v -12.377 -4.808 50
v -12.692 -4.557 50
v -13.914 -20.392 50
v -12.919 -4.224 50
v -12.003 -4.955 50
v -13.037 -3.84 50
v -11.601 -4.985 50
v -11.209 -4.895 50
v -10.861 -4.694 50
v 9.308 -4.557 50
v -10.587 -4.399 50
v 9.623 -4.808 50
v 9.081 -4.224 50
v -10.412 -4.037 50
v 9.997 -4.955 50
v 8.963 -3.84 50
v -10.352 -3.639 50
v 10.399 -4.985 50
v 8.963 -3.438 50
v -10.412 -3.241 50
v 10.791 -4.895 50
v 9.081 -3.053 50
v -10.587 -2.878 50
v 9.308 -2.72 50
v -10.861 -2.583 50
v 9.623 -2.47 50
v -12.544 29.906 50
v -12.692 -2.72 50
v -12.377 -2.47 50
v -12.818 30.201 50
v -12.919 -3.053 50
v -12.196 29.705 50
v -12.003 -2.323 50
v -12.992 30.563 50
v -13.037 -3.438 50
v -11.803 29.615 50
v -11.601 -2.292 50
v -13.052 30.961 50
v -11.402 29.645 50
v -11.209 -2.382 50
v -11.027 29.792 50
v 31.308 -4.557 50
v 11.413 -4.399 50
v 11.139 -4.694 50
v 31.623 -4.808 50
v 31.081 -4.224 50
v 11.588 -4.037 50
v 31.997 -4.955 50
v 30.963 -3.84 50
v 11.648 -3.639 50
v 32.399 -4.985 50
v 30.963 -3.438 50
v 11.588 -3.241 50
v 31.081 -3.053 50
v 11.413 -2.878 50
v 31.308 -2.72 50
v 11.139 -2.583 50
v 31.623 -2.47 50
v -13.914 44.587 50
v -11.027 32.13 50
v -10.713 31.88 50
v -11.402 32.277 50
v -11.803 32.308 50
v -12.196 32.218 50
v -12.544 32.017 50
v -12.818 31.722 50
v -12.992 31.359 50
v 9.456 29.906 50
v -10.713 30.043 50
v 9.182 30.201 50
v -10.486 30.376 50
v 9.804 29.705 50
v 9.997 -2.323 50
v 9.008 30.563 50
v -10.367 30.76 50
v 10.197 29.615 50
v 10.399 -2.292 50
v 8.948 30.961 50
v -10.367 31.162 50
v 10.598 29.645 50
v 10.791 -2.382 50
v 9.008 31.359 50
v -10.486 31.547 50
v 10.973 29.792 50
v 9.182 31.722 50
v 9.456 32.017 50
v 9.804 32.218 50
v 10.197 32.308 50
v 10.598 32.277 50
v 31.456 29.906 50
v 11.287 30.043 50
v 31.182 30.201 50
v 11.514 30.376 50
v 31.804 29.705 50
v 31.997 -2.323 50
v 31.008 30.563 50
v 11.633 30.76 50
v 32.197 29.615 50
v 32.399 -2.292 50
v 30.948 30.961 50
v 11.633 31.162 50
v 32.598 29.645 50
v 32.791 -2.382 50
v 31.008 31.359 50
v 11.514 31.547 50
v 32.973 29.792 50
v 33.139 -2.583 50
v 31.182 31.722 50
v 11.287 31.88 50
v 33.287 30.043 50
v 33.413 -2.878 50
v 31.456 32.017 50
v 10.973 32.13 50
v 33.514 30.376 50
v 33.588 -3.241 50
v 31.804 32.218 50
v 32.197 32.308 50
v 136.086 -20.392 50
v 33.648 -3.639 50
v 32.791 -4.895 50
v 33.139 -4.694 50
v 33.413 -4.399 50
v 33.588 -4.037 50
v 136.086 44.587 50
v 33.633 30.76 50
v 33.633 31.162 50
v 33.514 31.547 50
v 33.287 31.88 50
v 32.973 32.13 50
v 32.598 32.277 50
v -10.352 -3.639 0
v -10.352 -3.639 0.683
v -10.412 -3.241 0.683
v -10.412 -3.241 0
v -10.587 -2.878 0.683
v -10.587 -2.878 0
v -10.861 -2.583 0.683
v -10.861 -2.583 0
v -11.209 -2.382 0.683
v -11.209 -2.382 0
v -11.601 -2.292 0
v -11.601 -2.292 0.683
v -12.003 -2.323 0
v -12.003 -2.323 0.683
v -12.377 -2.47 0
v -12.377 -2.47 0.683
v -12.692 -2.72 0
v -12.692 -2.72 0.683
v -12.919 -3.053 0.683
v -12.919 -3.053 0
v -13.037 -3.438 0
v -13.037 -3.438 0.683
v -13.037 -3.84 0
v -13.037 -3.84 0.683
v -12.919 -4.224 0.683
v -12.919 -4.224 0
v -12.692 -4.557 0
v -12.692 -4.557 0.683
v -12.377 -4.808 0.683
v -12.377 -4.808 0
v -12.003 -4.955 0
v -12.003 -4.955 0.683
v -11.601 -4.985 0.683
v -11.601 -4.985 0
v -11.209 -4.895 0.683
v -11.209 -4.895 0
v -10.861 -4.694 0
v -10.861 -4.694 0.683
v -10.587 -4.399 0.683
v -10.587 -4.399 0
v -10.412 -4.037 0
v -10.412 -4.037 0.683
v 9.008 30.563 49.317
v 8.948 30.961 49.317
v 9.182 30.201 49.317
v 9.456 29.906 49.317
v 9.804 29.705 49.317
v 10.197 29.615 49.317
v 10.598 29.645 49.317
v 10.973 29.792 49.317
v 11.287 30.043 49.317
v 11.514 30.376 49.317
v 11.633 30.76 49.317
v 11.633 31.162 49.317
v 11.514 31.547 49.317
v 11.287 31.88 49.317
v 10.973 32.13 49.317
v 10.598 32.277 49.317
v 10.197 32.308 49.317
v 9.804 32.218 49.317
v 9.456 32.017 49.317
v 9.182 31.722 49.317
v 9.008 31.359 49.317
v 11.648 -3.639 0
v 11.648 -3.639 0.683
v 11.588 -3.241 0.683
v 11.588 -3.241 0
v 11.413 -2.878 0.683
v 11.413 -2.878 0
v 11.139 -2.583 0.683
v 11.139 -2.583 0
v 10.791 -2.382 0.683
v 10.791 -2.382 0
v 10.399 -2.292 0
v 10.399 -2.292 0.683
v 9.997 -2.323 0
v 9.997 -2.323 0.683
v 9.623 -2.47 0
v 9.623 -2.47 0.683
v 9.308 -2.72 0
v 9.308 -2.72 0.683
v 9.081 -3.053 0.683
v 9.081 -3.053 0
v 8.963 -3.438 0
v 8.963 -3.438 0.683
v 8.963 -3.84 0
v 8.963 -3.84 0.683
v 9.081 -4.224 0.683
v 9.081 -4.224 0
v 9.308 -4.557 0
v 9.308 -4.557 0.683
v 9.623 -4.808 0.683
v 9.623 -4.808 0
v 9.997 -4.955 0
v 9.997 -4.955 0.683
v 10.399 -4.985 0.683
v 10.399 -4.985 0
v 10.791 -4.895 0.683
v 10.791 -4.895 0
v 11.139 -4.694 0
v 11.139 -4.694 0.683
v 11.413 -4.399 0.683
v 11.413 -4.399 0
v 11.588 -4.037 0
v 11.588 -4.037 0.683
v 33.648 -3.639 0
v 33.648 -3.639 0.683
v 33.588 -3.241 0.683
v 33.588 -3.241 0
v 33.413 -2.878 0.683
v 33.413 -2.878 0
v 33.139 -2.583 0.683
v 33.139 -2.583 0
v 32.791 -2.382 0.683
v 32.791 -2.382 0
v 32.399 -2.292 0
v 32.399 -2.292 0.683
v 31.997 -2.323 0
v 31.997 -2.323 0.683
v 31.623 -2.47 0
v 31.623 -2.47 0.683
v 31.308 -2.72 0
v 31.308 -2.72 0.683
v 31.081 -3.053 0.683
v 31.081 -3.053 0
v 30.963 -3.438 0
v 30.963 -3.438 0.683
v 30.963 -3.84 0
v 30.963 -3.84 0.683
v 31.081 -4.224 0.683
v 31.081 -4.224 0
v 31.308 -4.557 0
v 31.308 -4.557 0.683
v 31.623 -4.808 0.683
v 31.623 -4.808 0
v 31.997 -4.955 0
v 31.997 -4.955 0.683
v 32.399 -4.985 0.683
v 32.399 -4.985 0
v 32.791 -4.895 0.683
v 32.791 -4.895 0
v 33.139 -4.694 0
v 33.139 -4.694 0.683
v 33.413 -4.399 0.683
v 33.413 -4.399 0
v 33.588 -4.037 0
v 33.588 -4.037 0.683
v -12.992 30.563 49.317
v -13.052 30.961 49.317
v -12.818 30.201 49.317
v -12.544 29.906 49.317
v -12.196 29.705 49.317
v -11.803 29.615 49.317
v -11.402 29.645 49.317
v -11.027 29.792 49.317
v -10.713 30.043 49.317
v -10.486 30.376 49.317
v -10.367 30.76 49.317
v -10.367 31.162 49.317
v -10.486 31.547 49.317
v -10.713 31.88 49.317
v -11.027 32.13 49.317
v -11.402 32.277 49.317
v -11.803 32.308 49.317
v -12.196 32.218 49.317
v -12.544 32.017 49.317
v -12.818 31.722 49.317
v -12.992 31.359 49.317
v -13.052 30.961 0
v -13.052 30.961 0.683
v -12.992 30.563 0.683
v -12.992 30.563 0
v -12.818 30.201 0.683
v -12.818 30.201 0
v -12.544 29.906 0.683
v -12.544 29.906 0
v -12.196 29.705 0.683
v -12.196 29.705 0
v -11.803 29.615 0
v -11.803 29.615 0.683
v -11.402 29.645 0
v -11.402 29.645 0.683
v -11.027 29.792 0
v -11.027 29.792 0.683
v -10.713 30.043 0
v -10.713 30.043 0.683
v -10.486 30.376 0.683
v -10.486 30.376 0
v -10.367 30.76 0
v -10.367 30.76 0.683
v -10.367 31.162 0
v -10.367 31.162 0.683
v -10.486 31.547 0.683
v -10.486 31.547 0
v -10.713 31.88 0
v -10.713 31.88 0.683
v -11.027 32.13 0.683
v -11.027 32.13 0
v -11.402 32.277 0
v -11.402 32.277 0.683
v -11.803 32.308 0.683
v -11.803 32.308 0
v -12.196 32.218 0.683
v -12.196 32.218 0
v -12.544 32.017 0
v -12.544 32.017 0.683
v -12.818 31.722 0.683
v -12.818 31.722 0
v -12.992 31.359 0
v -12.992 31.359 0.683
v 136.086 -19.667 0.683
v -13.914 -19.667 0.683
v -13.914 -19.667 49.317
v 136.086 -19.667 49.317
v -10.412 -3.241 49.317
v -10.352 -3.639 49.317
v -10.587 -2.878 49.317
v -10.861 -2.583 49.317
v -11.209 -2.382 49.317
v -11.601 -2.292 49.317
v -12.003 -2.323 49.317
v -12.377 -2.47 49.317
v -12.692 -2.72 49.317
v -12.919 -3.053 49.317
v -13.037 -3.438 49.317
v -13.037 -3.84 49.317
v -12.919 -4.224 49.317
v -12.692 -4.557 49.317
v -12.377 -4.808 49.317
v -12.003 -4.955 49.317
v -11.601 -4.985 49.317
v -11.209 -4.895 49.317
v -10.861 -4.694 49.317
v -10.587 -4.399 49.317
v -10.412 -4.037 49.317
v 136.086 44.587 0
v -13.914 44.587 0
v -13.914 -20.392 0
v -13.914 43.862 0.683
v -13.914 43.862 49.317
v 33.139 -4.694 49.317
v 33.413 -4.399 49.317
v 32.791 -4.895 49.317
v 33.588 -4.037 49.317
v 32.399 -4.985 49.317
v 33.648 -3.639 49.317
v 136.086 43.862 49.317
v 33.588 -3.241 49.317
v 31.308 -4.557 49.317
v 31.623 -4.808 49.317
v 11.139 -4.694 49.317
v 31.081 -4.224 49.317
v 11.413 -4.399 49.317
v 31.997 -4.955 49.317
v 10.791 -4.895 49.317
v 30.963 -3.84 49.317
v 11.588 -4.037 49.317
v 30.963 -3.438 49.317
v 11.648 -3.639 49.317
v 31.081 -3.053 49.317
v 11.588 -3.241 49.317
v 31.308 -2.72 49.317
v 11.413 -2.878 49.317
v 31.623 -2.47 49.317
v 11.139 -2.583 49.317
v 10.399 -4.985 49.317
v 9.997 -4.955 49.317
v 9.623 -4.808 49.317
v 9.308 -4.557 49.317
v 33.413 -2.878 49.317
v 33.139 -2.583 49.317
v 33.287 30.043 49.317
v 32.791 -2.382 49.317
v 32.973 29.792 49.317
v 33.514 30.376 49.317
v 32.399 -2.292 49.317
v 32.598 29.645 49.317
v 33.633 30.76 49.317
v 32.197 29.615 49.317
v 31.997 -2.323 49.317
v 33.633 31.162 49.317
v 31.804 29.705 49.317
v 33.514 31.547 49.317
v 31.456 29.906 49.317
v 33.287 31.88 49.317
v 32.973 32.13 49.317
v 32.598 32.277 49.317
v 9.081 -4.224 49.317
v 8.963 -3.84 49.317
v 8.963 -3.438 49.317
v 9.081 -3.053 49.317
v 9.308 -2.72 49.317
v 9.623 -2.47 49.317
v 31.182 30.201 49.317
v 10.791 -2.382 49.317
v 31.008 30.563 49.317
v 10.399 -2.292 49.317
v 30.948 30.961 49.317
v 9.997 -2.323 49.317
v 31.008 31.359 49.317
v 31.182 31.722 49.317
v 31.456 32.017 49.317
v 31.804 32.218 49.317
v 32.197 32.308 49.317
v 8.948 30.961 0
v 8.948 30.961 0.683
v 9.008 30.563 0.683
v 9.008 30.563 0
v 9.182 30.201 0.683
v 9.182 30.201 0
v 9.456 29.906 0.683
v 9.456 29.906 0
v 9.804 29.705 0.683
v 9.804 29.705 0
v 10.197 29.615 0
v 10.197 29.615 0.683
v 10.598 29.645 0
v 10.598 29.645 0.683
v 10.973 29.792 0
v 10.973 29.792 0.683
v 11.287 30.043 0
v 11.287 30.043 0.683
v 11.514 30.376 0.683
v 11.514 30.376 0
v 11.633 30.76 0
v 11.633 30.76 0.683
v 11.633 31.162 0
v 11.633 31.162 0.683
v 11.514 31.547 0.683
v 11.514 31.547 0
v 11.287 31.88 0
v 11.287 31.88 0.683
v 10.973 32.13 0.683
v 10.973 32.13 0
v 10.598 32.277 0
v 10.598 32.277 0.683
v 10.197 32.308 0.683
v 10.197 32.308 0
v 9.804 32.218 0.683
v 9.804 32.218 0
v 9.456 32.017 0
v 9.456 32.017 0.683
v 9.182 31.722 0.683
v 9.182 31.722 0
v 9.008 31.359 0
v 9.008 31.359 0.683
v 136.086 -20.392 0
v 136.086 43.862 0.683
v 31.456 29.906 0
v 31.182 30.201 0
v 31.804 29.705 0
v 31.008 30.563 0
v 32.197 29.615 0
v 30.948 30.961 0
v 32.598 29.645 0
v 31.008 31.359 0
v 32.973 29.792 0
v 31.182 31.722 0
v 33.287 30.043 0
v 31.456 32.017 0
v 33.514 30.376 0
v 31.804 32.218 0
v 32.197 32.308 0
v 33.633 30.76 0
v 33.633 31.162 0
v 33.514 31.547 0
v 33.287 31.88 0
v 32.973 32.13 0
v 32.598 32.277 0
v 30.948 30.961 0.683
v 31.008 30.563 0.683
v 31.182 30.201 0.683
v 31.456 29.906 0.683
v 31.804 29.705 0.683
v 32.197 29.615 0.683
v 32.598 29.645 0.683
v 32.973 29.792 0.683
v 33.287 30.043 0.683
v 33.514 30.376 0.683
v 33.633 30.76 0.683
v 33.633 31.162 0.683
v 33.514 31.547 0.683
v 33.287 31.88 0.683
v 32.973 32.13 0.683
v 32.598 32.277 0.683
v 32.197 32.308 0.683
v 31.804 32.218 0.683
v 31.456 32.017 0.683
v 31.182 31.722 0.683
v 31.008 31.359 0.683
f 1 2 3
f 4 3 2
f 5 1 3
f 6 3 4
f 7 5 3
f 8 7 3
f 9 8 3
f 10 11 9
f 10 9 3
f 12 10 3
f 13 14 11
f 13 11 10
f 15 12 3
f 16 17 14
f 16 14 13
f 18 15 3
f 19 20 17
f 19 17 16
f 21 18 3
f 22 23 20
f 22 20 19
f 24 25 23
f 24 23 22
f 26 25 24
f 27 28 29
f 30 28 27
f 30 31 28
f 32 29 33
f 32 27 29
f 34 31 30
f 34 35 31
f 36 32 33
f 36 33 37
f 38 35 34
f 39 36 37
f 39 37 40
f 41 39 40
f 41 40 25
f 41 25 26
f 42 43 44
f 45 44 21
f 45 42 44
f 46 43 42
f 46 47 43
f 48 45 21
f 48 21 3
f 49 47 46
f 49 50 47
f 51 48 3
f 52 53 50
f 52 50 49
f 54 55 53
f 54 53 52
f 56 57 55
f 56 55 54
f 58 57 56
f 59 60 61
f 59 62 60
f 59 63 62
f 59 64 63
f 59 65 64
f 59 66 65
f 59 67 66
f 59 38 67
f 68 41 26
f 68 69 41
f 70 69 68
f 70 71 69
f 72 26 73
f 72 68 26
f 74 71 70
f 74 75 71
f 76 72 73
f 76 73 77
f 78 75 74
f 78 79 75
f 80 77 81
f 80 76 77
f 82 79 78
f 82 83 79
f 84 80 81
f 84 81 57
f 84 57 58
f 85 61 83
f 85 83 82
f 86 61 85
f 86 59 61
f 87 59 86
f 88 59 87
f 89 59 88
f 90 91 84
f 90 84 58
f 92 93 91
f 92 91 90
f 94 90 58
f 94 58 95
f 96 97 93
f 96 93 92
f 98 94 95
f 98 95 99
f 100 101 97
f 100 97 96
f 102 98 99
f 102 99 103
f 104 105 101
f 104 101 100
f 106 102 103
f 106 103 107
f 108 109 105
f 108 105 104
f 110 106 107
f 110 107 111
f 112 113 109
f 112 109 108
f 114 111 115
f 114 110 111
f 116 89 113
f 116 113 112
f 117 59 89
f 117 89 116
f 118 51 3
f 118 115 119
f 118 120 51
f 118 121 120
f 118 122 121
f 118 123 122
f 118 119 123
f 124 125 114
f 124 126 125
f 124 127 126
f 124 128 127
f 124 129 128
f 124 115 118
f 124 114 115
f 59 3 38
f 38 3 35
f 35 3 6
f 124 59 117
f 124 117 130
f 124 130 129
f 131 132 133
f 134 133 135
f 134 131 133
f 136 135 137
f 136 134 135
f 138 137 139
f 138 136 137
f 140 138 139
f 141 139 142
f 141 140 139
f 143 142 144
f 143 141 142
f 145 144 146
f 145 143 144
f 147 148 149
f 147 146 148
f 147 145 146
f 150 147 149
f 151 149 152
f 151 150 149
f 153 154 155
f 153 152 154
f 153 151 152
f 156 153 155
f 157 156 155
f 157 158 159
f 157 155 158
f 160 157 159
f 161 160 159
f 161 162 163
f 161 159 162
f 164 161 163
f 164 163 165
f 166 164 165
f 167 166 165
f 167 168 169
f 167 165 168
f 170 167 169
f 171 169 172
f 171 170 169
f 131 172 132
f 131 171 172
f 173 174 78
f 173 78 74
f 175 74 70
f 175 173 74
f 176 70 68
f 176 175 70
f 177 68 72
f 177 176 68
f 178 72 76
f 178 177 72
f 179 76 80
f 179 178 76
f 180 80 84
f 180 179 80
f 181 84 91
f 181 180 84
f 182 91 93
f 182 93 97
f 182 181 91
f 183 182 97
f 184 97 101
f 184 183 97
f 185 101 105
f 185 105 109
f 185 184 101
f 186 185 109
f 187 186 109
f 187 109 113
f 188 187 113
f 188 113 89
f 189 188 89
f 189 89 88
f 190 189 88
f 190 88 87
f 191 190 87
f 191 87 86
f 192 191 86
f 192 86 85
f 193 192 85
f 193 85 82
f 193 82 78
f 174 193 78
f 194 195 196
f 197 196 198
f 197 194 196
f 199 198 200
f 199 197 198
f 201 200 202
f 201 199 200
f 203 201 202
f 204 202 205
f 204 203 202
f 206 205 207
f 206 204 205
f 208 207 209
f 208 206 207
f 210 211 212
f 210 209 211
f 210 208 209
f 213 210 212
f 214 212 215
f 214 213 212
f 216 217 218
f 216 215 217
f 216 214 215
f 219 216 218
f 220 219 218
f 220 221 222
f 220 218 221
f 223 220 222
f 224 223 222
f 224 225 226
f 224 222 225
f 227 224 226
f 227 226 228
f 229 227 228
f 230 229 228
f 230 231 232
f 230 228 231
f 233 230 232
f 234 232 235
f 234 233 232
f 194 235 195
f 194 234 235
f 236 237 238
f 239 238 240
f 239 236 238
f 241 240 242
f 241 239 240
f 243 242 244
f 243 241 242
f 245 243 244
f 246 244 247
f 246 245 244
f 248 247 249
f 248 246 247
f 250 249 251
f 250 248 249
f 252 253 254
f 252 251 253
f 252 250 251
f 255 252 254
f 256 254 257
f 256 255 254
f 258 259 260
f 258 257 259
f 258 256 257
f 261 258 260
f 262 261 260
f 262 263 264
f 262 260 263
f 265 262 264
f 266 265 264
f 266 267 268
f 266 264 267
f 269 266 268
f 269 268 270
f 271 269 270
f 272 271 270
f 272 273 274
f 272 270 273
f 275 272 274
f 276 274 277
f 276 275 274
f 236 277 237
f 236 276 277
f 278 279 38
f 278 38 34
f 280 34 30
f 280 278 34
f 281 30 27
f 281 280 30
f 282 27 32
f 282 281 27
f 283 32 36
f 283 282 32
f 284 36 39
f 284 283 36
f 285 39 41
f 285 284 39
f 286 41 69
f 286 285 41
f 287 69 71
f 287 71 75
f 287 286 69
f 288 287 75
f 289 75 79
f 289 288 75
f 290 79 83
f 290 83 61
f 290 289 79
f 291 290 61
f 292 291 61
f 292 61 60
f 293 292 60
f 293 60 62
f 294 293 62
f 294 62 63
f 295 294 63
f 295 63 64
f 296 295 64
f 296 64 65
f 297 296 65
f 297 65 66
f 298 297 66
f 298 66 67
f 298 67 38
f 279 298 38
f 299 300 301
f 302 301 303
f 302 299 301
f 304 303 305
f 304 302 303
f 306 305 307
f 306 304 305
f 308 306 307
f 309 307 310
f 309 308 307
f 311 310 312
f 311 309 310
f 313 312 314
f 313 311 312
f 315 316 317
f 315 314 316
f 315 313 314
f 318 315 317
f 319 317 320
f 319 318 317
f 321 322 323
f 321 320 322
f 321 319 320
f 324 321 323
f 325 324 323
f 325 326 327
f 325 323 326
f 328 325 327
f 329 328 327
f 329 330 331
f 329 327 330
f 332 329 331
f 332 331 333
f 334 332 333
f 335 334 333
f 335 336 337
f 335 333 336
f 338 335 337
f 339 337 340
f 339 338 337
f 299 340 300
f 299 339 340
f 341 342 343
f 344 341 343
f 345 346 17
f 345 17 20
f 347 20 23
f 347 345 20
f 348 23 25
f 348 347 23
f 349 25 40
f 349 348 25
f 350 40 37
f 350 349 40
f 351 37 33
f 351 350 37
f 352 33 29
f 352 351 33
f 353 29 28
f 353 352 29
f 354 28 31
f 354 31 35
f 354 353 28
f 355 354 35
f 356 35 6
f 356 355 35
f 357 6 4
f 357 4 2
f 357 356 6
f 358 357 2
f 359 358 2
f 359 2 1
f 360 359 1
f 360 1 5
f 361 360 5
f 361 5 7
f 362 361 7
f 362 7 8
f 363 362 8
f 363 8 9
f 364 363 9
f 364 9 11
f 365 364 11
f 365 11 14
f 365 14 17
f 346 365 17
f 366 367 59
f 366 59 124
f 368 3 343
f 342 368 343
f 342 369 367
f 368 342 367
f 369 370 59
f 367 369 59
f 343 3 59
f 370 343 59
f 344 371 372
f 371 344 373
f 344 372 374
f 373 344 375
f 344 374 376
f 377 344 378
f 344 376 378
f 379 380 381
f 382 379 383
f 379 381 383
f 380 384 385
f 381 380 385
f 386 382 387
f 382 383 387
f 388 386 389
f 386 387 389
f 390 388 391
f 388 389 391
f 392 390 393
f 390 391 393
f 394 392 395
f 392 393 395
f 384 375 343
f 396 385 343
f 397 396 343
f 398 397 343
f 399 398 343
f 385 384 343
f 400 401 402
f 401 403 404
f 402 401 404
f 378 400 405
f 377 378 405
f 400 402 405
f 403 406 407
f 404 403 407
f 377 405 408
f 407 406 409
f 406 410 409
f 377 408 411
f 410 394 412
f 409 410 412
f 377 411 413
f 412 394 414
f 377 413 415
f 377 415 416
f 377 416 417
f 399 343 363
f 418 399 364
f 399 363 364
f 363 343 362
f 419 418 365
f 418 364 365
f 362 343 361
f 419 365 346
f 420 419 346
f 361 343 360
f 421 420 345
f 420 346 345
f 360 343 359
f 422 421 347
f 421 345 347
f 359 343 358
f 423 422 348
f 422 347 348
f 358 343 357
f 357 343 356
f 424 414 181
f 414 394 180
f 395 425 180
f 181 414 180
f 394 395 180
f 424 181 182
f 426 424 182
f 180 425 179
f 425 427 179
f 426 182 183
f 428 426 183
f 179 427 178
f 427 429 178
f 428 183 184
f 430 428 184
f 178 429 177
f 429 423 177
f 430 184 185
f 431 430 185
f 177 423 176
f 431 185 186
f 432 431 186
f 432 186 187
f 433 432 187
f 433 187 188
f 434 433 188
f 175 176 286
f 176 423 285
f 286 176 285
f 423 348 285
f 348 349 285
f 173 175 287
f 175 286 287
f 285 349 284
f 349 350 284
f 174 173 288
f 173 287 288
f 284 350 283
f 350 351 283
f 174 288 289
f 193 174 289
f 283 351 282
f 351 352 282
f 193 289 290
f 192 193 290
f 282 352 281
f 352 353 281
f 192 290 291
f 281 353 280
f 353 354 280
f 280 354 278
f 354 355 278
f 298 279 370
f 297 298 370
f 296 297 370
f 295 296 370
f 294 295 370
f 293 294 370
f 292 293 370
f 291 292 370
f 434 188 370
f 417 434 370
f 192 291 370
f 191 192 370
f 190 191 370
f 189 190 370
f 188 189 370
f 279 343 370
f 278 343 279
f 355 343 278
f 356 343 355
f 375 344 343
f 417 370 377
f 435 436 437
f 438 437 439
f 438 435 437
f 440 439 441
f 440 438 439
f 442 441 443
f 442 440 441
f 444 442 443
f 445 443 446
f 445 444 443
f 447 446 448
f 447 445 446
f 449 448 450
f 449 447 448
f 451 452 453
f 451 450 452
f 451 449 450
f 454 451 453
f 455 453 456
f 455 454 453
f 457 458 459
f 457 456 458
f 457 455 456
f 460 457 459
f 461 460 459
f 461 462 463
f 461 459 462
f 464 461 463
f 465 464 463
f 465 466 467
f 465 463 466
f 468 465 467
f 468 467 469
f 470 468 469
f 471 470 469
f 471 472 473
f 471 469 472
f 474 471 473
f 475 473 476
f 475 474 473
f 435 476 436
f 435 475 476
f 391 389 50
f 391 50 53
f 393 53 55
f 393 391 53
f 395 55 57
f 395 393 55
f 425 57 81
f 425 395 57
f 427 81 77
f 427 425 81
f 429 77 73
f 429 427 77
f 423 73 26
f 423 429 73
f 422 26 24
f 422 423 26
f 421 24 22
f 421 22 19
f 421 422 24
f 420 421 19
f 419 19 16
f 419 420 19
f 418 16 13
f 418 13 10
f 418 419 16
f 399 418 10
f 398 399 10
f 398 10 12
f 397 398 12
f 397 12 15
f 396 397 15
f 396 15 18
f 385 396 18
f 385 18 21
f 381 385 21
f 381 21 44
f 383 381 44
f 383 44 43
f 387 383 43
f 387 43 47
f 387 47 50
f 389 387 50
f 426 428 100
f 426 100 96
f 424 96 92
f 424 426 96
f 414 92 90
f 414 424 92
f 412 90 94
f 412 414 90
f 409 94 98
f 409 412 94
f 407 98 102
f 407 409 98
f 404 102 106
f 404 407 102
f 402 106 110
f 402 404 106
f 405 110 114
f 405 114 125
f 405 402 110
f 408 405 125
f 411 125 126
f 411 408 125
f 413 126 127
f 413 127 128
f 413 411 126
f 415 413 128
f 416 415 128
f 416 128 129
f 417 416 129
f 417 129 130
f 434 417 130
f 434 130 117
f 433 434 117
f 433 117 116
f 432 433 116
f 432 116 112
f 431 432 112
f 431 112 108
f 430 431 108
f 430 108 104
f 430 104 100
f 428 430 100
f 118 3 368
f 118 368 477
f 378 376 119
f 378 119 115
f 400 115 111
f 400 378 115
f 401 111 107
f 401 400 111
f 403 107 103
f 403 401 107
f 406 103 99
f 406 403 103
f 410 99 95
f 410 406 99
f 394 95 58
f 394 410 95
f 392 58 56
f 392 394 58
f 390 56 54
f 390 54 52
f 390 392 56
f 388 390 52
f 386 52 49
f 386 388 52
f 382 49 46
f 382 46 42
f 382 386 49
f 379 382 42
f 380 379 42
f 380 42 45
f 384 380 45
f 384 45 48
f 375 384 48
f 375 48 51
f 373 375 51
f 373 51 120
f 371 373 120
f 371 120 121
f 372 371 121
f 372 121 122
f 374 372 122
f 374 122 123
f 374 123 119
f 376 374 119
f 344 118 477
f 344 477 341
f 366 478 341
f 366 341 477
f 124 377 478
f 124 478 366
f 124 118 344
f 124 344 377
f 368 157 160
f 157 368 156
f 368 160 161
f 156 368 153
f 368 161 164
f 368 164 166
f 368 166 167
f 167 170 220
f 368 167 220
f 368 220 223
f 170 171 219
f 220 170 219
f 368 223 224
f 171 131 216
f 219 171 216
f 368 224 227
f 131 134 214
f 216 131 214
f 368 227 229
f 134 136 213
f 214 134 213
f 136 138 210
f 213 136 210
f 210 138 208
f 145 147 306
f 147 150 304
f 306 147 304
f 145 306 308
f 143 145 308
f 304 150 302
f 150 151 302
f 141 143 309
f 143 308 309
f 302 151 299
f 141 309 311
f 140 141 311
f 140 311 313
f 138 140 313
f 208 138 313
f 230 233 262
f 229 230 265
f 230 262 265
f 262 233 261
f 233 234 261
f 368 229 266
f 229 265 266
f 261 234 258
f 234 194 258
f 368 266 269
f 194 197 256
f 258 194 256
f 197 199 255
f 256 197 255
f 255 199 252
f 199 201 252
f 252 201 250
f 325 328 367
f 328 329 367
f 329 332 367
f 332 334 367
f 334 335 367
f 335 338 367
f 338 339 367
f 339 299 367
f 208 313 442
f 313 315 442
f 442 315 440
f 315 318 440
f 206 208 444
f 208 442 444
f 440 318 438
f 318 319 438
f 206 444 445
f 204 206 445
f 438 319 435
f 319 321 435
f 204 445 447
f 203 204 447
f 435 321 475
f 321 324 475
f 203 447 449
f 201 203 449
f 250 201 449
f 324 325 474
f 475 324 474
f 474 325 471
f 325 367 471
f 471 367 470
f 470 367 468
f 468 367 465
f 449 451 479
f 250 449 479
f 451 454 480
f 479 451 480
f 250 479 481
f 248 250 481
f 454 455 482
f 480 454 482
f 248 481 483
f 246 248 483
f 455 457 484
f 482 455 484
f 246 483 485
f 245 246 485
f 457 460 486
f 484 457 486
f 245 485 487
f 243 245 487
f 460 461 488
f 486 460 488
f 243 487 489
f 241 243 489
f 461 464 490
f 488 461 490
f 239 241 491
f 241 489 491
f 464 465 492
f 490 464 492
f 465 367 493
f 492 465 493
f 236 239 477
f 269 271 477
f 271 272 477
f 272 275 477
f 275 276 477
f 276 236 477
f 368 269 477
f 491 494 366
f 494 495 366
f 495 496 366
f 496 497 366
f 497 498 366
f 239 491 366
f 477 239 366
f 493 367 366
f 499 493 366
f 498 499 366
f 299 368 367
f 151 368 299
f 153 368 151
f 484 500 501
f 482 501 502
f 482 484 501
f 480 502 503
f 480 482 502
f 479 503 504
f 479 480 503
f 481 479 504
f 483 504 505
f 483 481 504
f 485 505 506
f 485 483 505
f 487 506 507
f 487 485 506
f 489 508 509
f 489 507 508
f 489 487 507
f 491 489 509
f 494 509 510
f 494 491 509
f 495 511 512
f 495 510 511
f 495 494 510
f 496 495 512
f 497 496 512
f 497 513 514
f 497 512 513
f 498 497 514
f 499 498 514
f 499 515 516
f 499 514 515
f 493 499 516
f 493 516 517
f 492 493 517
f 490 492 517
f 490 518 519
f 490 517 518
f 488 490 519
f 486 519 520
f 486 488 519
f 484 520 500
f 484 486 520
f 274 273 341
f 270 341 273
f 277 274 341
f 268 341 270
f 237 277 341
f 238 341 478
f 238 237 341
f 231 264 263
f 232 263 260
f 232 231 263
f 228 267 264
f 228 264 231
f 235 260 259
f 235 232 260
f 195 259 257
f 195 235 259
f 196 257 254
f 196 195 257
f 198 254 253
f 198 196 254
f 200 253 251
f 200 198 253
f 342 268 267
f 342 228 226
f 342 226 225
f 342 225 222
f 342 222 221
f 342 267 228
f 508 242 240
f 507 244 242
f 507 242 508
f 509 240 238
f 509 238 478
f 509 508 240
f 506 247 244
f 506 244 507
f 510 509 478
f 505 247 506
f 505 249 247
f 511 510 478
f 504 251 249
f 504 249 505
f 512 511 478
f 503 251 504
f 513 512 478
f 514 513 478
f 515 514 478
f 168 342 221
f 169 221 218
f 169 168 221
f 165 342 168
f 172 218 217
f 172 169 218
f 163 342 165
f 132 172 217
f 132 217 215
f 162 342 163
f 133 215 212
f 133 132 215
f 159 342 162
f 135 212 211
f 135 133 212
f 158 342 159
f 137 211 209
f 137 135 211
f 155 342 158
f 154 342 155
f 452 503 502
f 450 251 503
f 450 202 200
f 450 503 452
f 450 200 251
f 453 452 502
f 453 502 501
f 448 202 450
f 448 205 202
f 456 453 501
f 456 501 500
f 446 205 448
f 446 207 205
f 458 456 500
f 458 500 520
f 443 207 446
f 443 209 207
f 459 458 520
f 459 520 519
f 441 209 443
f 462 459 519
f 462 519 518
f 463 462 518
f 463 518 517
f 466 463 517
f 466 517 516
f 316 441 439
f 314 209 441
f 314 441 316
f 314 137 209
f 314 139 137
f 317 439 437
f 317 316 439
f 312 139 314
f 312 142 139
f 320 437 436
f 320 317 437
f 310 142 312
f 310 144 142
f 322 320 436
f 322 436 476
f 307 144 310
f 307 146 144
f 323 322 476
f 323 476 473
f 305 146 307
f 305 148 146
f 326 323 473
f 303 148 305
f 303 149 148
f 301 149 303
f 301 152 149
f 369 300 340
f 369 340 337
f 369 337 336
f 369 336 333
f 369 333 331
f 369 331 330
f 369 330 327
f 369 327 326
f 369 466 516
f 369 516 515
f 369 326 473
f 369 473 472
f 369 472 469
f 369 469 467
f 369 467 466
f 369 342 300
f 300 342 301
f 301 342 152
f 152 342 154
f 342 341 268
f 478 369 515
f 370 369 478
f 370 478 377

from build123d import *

# Parameters (mm, degrees)
ESBO_O1_W                = 150
ESBO_O1_H                = 50
ESBO_O1_R                = 1.35
RESSALTO_EXTRUS_O1_DEPTH = 50
ESBO_O5_W                = 150
ESBO_O5_H                = 14.978385154
RESSALTO_EXTRUS_O2_DEPTH = 50
ESBO_O6_W                = 48.634106334
ESBO_O6_H                = 63.528836918
CORTE_EXTRUS_O6_DEPTH    = 165.280193846


with BuildPart() as part:
    # Esboço1 → Ressalto-extrusão1 (new body)
    with BuildSketch(Plane.XY):
        with Locations((61.085582475, 19.586792778)):
            Rectangle(ESBO_O1_W, ESBO_O1_H)
        with Locations((-11.702376595, -3.638707723)):
            Circle(ESBO_O1_R, mode=Mode.SUBTRACT)
        with Locations((10.297623405, -3.638707723)):
            Circle(ESBO_O1_R, mode=Mode.SUBTRACT)
        with Locations((32.297623405, -3.638707723)):
            Circle(ESBO_O1_R, mode=Mode.SUBTRACT)
        with Locations(Location((32.297623405, 30.961292277, 0), (0, 0, 180))):
            Circle(ESBO_O1_R, mode=Mode.SUBTRACT)
        with Locations(Location((10.297623405, 30.961292277, 0), (0, 0, 180))):
            Circle(ESBO_O1_R, mode=Mode.SUBTRACT)
        with Locations(Location((-11.702376595, 30.961292277, 0), (0, 0, 180))):
            Circle(ESBO_O1_R, mode=Mode.SUBTRACT)
    extrude(amount=RESSALTO_EXTRUS_O1_DEPTH)

    # Esboço5 → Ressalto-extrusão2 (add)
    with BuildSketch(Plane.XY.offset(50)):
        with Locations((61.085582475, -12.902399799)):
            Rectangle(ESBO_O5_W, ESBO_O5_H)
    extrude(amount=-RESSALTO_EXTRUS_O2_DEPTH)

    # Esboço6 → Corte-extrusão6 (cut, through all)
    with BuildSketch(Plane.ZY.offset(13.914417525)):
        with Locations((25, 12.097600201)):
            Rectangle(ESBO_O6_W, ESBO_O6_H)
    extrude(amount=-CORTE_EXTRUS_O6_DEPTH, mode=Mode.SUBTRACT)


solid = part.part
